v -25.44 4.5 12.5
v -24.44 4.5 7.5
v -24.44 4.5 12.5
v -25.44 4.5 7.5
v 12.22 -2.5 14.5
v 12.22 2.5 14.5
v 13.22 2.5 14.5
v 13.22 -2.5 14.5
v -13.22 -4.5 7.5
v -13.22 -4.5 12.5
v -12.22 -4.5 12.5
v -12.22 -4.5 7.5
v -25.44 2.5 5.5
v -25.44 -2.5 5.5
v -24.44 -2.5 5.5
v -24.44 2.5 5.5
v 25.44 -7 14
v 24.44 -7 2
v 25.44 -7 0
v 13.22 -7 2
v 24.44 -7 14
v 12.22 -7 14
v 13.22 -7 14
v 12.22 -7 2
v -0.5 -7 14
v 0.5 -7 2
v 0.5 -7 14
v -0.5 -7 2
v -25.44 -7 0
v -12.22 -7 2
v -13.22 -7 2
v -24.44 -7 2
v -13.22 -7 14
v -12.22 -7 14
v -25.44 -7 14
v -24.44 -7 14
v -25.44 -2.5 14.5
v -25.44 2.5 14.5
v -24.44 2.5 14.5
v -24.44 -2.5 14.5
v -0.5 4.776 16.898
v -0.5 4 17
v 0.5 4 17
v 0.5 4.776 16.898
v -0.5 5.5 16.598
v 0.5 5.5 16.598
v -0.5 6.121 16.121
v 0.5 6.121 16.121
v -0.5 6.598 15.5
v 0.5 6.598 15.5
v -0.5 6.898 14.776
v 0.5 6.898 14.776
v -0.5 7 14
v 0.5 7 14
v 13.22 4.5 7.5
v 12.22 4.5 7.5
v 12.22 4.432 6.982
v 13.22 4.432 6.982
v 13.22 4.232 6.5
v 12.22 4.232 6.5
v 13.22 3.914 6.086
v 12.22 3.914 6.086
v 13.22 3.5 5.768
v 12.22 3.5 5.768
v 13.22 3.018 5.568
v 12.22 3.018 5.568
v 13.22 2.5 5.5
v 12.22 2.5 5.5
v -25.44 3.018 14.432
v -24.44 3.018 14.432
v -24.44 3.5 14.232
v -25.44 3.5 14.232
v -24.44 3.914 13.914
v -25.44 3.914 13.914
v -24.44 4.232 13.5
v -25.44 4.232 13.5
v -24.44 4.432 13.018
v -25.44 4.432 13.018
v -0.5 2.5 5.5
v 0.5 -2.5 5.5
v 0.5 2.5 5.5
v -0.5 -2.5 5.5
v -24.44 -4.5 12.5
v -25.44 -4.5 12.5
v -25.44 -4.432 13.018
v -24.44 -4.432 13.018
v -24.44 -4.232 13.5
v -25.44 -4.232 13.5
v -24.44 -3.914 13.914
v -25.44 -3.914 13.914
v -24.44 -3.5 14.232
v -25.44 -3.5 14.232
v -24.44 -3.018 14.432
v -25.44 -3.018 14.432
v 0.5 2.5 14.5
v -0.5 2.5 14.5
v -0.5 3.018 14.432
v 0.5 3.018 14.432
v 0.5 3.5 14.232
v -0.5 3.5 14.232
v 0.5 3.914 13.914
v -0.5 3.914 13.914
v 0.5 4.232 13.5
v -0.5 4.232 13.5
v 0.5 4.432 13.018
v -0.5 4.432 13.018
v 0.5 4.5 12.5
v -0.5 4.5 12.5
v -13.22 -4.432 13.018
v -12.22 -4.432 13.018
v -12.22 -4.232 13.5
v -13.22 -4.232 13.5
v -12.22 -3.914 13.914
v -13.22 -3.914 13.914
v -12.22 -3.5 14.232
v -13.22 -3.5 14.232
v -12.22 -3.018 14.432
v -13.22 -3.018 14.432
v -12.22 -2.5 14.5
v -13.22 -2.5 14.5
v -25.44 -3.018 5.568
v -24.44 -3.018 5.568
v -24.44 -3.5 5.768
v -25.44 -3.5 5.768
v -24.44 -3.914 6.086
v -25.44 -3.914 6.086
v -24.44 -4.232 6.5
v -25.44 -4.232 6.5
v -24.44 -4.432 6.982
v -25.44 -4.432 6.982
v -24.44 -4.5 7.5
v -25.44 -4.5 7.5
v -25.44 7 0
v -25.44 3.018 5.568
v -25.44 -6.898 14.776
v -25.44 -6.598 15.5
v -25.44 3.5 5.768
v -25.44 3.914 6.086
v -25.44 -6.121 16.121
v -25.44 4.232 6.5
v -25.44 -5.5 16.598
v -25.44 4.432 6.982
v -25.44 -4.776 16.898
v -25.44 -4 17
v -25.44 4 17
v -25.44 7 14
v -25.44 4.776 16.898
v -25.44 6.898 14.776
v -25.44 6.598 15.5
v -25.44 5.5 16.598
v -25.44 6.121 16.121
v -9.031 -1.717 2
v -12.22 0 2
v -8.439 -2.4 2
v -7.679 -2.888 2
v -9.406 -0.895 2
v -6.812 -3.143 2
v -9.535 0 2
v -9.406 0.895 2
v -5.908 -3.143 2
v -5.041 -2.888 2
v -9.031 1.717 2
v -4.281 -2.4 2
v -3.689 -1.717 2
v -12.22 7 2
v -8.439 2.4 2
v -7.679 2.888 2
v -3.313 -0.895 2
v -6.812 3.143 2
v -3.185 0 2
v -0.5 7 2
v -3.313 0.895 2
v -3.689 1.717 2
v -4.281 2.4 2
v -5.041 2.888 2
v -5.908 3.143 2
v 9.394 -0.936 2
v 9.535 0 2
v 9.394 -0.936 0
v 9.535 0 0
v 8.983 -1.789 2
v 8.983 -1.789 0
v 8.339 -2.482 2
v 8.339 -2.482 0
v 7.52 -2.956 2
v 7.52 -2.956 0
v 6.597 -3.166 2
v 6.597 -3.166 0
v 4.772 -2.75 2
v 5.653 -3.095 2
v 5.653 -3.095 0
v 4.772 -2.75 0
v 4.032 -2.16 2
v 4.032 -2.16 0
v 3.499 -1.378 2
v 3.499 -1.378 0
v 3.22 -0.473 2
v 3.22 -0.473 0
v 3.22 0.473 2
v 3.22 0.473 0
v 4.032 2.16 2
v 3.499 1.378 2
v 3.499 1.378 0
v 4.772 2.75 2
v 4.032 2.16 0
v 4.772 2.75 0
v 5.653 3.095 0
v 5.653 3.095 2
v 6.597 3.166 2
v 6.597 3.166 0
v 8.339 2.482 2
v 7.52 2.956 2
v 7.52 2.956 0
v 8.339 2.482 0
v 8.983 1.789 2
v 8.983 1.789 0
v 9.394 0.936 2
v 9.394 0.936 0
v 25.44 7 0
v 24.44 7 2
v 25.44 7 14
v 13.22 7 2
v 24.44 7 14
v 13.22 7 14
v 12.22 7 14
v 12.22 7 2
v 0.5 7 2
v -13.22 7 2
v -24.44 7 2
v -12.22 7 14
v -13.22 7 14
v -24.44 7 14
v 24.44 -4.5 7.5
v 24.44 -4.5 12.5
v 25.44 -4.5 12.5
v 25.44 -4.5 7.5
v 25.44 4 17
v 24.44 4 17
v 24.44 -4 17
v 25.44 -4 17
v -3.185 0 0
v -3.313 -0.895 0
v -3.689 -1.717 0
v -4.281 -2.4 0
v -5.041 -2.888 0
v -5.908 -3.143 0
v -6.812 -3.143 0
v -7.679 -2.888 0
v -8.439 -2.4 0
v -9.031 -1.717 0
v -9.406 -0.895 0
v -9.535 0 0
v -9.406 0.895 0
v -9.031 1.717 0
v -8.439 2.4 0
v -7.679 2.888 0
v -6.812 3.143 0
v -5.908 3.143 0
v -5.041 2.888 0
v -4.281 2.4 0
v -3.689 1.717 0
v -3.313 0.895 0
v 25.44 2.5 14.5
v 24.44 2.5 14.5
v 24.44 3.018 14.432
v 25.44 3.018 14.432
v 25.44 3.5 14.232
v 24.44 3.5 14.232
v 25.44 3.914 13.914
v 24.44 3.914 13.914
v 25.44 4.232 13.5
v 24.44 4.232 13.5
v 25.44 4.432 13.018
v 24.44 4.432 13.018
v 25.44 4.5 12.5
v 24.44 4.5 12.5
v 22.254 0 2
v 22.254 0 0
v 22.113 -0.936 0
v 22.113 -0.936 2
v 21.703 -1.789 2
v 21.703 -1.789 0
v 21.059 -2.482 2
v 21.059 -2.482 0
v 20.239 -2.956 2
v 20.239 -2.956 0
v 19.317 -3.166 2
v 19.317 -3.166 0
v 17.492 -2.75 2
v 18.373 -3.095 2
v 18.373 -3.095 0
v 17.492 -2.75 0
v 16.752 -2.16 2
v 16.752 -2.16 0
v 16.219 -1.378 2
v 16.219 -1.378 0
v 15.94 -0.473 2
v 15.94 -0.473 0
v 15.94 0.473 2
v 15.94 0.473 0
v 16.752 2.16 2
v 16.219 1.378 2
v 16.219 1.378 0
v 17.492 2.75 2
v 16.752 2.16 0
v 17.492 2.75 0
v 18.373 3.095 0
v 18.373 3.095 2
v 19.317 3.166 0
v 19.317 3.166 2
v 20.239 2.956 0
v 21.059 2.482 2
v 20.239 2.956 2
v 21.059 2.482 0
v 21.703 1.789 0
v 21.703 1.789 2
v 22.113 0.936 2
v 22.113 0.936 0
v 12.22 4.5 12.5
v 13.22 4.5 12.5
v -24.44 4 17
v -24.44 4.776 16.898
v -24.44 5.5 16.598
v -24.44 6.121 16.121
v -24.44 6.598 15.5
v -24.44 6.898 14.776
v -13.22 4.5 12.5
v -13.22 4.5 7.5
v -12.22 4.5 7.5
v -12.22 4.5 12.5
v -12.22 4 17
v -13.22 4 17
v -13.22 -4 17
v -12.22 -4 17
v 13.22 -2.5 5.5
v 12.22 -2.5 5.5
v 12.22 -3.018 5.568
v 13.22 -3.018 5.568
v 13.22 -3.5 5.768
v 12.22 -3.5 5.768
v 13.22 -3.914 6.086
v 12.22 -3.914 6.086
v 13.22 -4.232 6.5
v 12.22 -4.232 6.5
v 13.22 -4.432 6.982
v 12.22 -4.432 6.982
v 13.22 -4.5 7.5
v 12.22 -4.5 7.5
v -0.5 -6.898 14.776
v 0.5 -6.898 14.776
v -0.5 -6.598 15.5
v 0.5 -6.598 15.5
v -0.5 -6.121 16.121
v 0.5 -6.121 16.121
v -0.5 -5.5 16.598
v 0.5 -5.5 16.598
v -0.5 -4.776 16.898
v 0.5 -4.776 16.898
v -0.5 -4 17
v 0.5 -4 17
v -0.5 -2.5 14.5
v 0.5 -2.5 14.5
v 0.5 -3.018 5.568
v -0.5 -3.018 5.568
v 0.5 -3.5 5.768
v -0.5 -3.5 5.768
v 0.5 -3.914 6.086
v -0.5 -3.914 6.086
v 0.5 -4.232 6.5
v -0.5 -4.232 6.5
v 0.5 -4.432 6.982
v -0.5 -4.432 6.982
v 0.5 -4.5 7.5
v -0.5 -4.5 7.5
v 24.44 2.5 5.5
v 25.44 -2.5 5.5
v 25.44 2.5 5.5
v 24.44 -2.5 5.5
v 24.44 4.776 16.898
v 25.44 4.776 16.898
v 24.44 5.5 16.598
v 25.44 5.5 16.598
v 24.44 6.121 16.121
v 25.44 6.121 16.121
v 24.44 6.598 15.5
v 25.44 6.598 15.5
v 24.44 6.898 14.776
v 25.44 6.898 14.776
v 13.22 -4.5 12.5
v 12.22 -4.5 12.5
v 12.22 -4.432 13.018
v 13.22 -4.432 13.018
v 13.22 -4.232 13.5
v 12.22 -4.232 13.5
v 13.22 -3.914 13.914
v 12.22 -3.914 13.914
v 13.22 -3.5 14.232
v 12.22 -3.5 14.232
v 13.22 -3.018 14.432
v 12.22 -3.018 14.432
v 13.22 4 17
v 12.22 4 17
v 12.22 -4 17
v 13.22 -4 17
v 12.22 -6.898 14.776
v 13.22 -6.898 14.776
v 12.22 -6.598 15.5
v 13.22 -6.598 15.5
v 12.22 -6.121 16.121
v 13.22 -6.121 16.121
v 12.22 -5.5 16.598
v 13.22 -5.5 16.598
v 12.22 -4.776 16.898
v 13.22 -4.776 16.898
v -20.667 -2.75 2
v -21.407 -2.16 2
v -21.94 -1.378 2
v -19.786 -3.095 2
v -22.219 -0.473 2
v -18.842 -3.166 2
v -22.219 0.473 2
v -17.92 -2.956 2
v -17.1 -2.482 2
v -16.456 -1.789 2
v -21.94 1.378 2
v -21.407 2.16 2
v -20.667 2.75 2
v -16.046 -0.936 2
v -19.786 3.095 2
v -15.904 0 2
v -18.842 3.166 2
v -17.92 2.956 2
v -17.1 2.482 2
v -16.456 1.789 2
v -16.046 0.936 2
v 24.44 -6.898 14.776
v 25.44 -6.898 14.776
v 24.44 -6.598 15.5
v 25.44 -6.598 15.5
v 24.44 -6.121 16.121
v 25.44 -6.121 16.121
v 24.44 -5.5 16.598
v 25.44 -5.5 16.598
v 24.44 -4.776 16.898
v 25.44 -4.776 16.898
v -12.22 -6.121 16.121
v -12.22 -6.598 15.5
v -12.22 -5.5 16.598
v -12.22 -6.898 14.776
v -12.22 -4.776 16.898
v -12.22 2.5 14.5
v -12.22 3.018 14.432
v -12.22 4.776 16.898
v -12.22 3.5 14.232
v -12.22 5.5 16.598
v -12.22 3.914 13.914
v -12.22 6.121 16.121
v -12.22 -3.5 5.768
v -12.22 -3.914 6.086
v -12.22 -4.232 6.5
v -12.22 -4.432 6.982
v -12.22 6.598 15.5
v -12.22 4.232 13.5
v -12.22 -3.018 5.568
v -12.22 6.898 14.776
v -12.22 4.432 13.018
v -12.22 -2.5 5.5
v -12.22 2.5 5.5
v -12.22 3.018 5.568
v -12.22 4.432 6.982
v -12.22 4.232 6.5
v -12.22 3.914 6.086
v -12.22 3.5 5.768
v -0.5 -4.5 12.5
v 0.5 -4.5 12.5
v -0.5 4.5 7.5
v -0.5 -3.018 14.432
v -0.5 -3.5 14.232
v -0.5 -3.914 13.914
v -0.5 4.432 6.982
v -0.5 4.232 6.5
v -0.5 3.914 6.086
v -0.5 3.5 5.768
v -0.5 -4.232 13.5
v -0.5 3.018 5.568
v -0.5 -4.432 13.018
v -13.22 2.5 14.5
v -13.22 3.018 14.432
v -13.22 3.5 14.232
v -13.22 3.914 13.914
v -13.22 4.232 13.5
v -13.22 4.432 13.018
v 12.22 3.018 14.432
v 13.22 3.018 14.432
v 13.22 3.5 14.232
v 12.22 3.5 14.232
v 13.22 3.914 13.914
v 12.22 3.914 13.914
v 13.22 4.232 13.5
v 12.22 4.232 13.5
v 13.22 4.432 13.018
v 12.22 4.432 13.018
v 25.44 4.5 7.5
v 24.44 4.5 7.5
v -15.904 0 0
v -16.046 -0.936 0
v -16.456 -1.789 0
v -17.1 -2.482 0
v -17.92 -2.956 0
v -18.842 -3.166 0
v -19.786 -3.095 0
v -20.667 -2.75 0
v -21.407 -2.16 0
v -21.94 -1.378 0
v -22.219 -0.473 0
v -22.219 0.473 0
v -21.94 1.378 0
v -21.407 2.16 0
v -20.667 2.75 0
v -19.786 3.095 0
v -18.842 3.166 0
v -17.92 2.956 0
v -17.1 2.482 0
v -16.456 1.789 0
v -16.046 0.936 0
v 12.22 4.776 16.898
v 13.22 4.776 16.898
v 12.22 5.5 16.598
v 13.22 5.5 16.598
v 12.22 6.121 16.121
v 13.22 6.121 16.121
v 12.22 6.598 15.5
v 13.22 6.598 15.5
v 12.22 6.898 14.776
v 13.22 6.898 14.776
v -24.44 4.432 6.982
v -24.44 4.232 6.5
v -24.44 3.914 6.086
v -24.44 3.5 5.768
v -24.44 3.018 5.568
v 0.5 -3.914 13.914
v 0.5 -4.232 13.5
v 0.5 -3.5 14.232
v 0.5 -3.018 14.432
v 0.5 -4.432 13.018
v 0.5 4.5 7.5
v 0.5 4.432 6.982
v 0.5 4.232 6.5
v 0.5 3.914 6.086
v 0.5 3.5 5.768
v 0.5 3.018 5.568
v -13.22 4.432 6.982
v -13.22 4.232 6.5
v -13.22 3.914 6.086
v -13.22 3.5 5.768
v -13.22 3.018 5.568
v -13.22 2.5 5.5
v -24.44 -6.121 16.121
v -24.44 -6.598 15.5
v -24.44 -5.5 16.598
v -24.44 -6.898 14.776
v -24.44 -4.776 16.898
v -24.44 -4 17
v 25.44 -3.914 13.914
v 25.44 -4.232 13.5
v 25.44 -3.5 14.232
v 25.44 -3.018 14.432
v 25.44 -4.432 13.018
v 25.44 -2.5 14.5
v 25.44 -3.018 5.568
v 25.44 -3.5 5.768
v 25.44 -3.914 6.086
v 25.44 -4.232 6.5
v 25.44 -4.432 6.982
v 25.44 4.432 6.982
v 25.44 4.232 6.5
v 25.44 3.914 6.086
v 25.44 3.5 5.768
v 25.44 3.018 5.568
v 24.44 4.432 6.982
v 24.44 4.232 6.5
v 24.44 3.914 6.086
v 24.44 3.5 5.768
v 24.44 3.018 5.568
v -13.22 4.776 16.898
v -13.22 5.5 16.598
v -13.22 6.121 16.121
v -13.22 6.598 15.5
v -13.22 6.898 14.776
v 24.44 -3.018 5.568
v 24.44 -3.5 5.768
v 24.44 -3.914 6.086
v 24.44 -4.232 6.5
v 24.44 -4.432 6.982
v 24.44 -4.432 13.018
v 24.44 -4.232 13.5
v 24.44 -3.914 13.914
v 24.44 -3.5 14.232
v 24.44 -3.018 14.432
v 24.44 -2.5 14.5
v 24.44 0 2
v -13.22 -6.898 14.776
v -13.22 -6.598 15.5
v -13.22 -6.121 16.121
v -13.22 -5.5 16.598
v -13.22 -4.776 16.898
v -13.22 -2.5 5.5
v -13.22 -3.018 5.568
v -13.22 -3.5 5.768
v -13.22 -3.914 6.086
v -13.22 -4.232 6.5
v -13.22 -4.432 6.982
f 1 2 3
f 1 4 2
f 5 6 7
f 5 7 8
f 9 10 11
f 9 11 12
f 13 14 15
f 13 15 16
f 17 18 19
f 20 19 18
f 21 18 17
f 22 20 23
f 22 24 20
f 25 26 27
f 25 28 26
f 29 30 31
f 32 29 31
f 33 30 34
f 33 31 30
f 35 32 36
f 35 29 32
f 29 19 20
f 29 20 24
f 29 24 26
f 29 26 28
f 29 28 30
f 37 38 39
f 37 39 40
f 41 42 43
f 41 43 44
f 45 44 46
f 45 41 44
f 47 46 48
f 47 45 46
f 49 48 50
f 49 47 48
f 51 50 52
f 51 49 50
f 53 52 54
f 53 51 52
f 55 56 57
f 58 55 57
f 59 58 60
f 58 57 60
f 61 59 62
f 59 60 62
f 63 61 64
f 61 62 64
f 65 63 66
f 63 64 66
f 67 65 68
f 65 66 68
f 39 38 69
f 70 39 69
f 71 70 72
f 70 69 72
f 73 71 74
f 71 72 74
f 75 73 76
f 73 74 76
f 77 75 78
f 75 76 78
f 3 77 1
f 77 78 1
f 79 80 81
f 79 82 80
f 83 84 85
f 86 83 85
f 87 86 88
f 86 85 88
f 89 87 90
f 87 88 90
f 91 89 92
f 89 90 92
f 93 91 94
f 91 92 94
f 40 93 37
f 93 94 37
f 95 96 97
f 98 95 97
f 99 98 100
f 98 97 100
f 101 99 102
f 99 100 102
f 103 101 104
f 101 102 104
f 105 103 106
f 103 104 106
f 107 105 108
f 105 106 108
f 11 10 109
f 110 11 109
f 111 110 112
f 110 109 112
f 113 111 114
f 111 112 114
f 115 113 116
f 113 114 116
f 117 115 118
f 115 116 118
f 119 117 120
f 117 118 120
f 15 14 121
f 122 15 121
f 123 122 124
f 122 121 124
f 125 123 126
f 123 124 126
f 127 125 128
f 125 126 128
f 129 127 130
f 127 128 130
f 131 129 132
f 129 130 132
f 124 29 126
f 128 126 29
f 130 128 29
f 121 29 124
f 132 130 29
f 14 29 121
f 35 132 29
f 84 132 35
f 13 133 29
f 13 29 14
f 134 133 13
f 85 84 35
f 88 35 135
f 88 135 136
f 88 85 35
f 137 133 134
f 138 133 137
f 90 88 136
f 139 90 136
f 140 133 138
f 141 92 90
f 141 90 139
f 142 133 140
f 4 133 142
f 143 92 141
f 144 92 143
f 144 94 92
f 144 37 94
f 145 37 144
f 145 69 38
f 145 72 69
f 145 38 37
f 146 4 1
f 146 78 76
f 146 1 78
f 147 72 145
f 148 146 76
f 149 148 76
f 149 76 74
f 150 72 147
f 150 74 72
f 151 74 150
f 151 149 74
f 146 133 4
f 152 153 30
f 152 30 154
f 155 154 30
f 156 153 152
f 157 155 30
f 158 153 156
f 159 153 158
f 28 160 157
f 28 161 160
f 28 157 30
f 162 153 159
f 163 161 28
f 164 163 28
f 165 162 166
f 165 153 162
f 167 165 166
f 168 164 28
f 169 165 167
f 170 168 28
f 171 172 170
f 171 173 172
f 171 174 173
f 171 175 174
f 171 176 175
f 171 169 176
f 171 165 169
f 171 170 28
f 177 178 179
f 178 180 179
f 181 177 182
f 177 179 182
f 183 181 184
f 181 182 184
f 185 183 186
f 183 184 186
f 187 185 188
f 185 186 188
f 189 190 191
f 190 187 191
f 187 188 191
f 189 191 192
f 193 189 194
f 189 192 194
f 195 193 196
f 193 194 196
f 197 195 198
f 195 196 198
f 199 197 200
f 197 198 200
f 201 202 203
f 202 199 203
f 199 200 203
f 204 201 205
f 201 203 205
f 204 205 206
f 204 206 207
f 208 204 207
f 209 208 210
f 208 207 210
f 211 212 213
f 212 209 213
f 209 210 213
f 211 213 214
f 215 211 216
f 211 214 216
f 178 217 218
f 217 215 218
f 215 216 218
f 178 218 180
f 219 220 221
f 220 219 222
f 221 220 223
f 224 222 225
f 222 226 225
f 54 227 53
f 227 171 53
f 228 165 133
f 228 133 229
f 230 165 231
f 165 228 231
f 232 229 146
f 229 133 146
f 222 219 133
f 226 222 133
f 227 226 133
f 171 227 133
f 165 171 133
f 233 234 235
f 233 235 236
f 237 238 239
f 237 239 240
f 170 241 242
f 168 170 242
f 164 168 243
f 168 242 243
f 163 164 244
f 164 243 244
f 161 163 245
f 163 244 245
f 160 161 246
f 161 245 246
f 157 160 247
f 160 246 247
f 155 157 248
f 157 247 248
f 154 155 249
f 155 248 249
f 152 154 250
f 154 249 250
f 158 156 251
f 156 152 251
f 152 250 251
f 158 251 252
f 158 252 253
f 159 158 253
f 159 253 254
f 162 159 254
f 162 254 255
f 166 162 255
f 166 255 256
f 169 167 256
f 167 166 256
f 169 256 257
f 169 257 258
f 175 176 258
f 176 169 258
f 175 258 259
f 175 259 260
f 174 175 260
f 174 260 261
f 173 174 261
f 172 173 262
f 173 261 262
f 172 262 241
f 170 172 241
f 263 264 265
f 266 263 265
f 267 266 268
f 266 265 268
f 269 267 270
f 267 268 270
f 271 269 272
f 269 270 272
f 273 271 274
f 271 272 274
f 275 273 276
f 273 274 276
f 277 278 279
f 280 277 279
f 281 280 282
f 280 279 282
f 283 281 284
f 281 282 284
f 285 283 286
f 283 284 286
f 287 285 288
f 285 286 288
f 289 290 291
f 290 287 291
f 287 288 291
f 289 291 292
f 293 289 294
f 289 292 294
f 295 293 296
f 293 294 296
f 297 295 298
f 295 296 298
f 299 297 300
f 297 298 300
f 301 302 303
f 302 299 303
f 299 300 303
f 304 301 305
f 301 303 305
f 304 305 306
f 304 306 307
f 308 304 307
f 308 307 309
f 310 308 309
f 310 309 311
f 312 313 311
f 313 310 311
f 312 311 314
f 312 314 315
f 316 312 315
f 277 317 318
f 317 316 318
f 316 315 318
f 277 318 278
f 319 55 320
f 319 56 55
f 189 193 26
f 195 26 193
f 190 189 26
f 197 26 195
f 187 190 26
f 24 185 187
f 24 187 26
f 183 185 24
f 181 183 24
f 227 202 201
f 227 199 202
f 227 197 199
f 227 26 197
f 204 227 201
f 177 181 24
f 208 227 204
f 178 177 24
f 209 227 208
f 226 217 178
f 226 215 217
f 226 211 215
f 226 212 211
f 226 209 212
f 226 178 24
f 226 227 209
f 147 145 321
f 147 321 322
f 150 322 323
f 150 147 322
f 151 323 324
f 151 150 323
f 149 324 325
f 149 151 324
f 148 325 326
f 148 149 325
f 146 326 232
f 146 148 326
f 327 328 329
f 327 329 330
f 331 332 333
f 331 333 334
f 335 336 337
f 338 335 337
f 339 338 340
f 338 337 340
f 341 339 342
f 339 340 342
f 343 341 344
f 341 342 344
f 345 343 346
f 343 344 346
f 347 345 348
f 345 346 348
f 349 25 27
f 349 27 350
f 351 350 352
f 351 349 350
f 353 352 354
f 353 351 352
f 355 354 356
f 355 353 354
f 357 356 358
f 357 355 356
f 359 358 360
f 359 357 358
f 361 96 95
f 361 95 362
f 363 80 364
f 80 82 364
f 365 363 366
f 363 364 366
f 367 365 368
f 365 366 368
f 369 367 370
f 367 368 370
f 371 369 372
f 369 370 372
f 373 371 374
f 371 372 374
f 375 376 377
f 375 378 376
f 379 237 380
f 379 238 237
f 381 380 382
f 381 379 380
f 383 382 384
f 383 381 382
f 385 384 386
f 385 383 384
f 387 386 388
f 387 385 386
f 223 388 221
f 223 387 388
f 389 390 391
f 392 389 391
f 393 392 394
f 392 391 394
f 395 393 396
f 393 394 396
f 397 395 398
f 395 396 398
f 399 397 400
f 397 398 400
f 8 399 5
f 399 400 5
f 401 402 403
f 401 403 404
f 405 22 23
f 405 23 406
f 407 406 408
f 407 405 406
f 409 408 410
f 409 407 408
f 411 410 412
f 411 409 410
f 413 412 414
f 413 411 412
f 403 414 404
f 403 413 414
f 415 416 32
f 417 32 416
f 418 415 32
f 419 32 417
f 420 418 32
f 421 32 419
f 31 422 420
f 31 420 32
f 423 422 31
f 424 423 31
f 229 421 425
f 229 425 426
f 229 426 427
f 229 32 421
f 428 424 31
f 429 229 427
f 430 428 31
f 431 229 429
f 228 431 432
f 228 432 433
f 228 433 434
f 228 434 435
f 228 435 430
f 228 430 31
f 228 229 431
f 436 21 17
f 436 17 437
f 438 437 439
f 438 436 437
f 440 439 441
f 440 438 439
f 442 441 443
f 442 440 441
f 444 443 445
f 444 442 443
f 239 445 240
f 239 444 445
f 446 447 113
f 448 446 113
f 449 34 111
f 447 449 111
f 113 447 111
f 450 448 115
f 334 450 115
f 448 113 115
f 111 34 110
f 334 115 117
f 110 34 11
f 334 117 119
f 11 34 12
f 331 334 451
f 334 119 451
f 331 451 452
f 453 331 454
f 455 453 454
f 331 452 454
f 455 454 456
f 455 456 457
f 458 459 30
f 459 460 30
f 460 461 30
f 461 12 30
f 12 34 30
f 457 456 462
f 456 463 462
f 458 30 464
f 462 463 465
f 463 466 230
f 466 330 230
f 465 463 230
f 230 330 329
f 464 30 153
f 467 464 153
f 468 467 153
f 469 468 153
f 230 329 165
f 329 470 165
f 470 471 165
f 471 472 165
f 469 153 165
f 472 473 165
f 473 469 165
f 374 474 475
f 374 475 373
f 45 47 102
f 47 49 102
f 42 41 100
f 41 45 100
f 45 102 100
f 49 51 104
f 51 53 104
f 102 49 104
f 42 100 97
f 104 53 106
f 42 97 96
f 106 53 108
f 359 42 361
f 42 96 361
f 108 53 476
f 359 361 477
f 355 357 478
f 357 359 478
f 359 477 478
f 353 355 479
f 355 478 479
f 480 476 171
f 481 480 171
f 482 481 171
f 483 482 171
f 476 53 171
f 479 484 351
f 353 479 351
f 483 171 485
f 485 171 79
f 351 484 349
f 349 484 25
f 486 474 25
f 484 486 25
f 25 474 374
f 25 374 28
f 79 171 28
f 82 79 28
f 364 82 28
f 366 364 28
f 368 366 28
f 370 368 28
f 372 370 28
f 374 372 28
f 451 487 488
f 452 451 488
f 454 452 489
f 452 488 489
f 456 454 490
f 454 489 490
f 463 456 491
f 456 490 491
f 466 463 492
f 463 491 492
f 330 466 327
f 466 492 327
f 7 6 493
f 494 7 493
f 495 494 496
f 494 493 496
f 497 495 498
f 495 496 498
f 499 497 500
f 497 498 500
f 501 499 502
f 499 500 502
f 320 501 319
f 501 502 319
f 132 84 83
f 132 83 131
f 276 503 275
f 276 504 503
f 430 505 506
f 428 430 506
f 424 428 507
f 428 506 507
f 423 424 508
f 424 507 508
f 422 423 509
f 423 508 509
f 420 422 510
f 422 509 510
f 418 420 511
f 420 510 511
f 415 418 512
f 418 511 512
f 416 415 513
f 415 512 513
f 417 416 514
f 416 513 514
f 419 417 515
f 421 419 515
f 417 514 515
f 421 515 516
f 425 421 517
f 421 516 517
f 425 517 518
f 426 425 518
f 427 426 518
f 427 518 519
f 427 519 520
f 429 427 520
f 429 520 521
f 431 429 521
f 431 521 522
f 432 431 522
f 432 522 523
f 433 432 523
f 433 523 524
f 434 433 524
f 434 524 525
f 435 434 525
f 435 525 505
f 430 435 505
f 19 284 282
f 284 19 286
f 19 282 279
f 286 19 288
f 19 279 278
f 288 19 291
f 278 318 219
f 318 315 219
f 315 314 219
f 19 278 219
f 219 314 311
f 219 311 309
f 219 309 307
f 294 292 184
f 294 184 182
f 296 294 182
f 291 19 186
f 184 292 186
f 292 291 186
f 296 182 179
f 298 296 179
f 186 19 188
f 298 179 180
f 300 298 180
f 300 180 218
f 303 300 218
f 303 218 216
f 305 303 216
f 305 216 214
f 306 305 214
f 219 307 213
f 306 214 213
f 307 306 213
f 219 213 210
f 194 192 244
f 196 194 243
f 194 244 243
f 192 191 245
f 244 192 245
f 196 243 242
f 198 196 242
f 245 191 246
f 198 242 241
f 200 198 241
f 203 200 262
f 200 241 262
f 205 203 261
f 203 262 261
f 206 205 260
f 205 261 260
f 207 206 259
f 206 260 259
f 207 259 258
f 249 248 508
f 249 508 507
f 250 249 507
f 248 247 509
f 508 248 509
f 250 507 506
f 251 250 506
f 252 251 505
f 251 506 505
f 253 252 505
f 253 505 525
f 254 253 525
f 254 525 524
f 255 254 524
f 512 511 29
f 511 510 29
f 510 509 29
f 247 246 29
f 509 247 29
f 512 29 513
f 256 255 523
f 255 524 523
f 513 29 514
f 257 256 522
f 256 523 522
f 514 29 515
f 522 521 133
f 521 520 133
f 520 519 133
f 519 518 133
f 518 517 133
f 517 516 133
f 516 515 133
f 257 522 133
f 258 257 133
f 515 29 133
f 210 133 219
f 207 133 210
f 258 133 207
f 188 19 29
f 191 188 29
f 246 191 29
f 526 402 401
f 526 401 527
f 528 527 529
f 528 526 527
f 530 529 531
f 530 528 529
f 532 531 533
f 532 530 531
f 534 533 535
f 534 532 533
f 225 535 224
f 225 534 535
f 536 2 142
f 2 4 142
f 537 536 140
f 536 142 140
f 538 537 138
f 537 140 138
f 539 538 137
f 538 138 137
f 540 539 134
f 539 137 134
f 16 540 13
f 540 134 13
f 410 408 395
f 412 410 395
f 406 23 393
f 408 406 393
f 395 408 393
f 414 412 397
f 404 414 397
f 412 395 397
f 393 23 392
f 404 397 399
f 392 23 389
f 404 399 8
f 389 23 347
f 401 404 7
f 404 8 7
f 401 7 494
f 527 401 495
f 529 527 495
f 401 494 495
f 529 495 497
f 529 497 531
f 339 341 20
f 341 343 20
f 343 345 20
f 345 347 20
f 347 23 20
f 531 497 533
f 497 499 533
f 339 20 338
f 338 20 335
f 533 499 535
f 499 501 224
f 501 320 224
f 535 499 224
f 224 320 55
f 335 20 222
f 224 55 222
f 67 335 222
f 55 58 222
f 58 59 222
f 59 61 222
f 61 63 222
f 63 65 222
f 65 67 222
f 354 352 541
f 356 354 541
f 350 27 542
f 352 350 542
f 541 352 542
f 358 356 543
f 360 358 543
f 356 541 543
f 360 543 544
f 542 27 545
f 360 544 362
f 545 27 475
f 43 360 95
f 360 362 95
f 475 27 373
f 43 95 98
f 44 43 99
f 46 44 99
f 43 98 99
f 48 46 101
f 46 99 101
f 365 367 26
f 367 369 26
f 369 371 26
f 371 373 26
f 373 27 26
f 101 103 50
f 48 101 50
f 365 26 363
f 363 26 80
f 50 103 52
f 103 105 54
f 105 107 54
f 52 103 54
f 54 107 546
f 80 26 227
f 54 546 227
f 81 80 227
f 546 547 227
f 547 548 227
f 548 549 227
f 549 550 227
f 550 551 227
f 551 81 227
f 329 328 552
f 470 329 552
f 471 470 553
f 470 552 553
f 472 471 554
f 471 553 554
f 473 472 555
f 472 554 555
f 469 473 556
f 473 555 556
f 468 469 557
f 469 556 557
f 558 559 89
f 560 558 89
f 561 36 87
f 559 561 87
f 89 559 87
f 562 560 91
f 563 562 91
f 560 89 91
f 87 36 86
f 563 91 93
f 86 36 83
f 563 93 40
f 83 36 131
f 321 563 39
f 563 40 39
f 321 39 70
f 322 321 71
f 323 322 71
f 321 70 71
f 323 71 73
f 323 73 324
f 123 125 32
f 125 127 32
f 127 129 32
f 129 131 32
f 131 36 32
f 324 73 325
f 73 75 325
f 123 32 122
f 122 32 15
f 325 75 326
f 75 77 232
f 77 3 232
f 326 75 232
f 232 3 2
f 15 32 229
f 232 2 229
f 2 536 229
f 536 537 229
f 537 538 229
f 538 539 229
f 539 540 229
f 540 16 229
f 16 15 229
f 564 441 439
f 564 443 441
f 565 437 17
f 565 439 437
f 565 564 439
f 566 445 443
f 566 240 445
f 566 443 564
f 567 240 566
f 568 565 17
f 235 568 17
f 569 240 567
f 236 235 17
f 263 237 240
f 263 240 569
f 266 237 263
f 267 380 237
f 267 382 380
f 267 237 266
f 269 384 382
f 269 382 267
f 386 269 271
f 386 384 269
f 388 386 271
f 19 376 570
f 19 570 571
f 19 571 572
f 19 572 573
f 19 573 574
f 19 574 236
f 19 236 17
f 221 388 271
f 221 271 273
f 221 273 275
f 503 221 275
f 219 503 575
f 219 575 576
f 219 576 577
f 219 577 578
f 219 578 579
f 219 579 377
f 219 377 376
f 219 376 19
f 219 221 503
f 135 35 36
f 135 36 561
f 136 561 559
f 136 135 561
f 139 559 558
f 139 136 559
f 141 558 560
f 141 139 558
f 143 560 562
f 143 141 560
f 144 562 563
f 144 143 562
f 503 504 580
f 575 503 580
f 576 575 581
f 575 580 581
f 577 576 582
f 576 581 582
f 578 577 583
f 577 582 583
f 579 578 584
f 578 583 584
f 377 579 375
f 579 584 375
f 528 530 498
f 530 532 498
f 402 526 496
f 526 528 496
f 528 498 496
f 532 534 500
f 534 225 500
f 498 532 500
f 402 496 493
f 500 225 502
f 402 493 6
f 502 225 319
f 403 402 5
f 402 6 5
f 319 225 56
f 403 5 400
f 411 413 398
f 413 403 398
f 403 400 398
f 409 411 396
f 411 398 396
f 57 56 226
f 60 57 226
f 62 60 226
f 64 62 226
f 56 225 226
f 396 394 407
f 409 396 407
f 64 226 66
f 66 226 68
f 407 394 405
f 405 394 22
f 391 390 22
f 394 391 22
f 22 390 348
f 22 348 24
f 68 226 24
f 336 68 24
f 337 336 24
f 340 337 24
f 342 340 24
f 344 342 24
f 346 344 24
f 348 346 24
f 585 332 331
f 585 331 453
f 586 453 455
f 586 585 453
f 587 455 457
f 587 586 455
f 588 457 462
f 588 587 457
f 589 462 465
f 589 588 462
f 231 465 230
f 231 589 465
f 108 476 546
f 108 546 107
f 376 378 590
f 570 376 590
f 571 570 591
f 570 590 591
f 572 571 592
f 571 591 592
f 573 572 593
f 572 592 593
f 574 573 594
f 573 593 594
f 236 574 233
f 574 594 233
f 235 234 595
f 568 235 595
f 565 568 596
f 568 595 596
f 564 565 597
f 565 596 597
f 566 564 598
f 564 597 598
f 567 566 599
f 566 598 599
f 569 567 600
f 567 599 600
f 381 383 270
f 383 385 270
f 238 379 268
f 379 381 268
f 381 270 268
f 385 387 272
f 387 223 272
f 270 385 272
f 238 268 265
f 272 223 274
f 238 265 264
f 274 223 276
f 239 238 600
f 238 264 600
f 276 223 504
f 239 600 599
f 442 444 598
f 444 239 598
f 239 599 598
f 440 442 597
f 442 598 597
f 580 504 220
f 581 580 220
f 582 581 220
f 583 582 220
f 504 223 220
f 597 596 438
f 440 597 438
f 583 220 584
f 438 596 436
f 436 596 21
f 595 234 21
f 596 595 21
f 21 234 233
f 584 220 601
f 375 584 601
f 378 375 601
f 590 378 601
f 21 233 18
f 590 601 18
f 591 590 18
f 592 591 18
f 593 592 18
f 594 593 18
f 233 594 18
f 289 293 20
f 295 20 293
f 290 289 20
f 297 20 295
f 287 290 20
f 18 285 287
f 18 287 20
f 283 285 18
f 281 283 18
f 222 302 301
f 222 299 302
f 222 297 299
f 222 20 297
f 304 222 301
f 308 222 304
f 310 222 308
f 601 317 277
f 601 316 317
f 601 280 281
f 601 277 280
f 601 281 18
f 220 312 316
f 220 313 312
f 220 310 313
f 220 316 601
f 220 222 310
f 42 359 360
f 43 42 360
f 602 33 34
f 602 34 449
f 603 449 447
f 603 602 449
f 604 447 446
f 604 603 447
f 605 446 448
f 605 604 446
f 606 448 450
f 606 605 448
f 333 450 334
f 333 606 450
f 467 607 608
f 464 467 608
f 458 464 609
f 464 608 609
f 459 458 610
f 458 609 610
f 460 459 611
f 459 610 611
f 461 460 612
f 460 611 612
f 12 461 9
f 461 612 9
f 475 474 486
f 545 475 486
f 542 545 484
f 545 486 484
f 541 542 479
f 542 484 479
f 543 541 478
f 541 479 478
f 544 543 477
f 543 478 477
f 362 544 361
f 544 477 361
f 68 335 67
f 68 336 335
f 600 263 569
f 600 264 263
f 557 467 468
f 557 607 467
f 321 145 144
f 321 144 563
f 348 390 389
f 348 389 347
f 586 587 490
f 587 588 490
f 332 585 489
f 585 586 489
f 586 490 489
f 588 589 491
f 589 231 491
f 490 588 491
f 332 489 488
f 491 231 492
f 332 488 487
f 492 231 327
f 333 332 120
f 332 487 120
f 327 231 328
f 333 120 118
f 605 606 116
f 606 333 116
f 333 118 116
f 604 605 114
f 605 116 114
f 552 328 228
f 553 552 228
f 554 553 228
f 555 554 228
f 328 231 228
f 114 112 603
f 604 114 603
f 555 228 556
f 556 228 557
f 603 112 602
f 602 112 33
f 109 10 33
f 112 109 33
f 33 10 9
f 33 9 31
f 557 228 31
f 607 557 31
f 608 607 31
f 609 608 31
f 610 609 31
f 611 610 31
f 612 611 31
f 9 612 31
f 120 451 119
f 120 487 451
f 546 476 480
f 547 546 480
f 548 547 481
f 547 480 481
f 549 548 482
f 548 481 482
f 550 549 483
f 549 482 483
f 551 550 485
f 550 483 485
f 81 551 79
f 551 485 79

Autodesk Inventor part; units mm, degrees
ref_plane "YZ Plane" through (0, 0, 0) normal (1, 0, 0) x (0, 1, 0)
ref_plane "XZ Plane" through (0, 0, 0) normal (0, 1, 0) x (-1, 0, 0)
ref_plane "XY Plane" through (0, 0, 0) normal (0, 0, 1) x (1, 0, 0)
sketch "Sketch1" plane through (0, 0, 0) normal (0, 0, 1) x (1, 0, 0)
  circle A0 centre (-19.0795, 0) radius 3.175 projected
  circle A1 centre (-6.3598, 0) radius 3.175 projected
  circle A2 centre (6.3597, 0) radius 3.175 projected
  circle A3 centre (19.0795, 0) radius 3.175 projected
  line L0 (25, -19) -> (25, 19) projected
  line L1 (-25, 19) -> (-25, -19) projected
  line L2 (-19.0795, 0) -> (-6.3598, 0)
  line L3 (-6.3598, 0) -> (-12.7197, 0)
  line L4 (-19.0795, 0) -> (-25.4395, 0)
  line L5 (19.0795, 0) -> (25.4395, 0)
  line L6 (-12.2197, 7) -> (-12.2197, -7)
  line L7 (-12.2197, -7) -> (-13.2197, -7)
  line L8 (-13.2197, -7) -> (-13.2197, 7)
  line L9 (-13.2197, 7) -> (-12.2197, 7)
  line L10 (-12.2197, 7) -> (-13.2197, -7) construction
  line L11 (-12.2197, -7) -> (-13.2197, 7) construction
  line L12 (-25.4395, 0) -> (-25.9395, 0)
  line L13 (-25.9395, 0) -> (-25.9395, 7)
  line L14 (25.4395, 0) -> (25.9395, 0)
  line L15 (25.9395, 0) -> (25.9395, -7)
  line L16 (-25.9395, 7) -> (25.9395, 7)
  line L17 (25.9395, 7) -> (25.9395, -7)
  line L18 (25.9395, -7) -> (-25.9395, -7)
  line L19 (-25.9395, -7) -> (-25.9395, 7)
  point P0 (0, 0)
  point P1 (-25, 7)
  point P2 (-25, -7)
  point P3 (25, -7)
  point P4 (25, 7)
  dimension "d0" = 6.36
  dimension "d1" = 6.36
  dimension "d2" = 14
  dimension "d3" = 1
  dimension "d4" = 0.5
  dimension "d5" = 7
  dimension "d6" = 0.5
  dimension "d7" = 7
extrude "Extrusion1" add sketch "Sketch1" along normal blind 2 contours L2 L8 L18 L1 L4 A0 | A0 L4 L1 L16 L8 L2 | L8 L9 L6 L2 | L2 L6 L7 L8 | L6 L16 L0 L18
sketch "Sketch2" plane through (0, 0, 2) normal (0, 0, 1) x (1, 0, 0)
  line L0 (-25, 7) -> (-24, 7)
  line L1 (25, 7) -> (-25, 7) projected
  circle A0 centre (-19.0795, 0) radius 3.175 projected
  circle A1 centre (-6.3598, 0) radius 3.175 projected
  line L2 (-19.0795, 0) -> (-6.3598, 0)
  line L3 (-13.2197, 7) -> (-13.2197, -7)
  line L4 (-13.2197, -7) -> (-12.2197, -7)
  line L5 (-12.2197, -7) -> (-12.2197, 7)
  line L6 (-12.2197, 7) -> (-13.2197, 7)
  line L7 (-13.2197, 7) -> (-12.2197, -7) construction
  line L8 (-13.2197, -7) -> (-12.2197, 7) construction
  line L9 (-0.5, 7) -> (-0.5, -7)
  line L10 (-0.5, -7) -> (0.5, -7)
  line L11 (0.5, -7) -> (0.5, 7)
  line L12 (0.5, 7) -> (-0.5, 7)
  line L13 (-0.5, 7) -> (0.5, -7) construction
  line L14 (-0.5, -7) -> (0.5, 7) construction
  circle A2 centre (6.3597, 0) radius 3.175 projected
  circle A3 centre (19.0795, 0) radius 3.175 projected
  line L15 (6.3597, 0) -> (19.0795, 0)
  line L16 (12.2196, 7) -> (12.2196, -7)
  line L17 (12.2196, -7) -> (13.2196, -7)
  line L18 (13.2196, -7) -> (13.2196, 7)
  line L19 (13.2196, 7) -> (12.2196, 7)
  line L20 (12.2196, 7) -> (13.2196, -7) construction
  line L21 (12.2196, -7) -> (13.2196, 7) construction
  line L22 (-24, 7) -> (-25, 7)
  line L23 (-25, 7) -> (-25, -7)
  line L24 (-25, -7) -> (-24, -7)
  line L25 (25, -7) -> (25, 7) projected
  line L26 (-25, -7) -> (25, -7) projected
  line L27 (25, 7) -> (24, 7)
  line L28 (24, 7) -> (24, -7)
  line L29 (24, -7) -> (25, -7)
  line L30 (25, -7) -> (25, 7)
  line L31 (-12.7197, 0) -> (-24.4397, 0)
  line L32 (-24.4397, 0) -> (-24.4397, 7)
  line L33 (-24.4397, 7) -> (-25.4397, 7)
  line L34 (-25.4397, 7) -> (-25.4397, -7)
  line L35 (-25.4397, -7) -> (-24.4397, -7)
  line L36 (-24.4397, -7) -> (-24.4397, 7)
  line L37 (0, 7) -> (0, -7)
  line L38 (25.4397, 7) -> (25.4397, -7)
  line L39 (25.4397, 7) -> (24.4397, 7)
  line L40 (24.4397, 7) -> (24.4397, -7)
  line L41 (24.4397, -7) -> (25.4397, -7)
  line L42 (25.4397, -7) -> (25.4397, 7)
  point P0 (0, 0)
  point P1 (12.7196, 0)
  dimension "d10" = 1
  dimension "d11" = 1
  dimension "d12" = 1
  dimension "d13" = 1
  dimension "d14" = 1
  dimension "d27" = 11.72
  dimension "d28" = 1
  dimension "d29" = 1
extrude "Extrusion2" add sketch "Sketch2" along normal blind 15 contours L0 L32 L36 L24 L23 | L23 L35 L34 L33 | L1 L5 L2 L3 | L2 L5 L4 L3 | L1 L37 L10 L9 | L1 L11 L10 L37 | L1 L18 L15 L16 | L15 L18 L17 L16 | L1 L25 L26 L40 | L39 L38 L41 L25
sketch "Sketch3" plane through (-25, -7, 0) normal (-1, 0, 0) x (0, 0, 1)
  line L0 (2, 14) -> (2, 0) projected
  line L1 (0, 14) -> (2, 14) projected
  line L2 (0, 0) -> (2, 0) projected
  line L3 (14, 14) -> (3, 14)
  line L4 (3, 14) -> (3, 0)
  line L5 (3, 0) -> (14, 0)
  line L6 (17, 3) -> (17, 11)
  line L7 (7.5, 11.5) -> (12.5, 11.5)
  line L8 (14.5, 9.5) -> (14.5, 4.5)
  line L9 (12.5, 2.5) -> (7.5, 2.5)
  line L10 (5.5, 4.5) -> (5.5, 9.5)
  line L11 (5.5, 11.5) -> (14.5, 2.5) construction
  line L12 (14.5, 11.5) -> (5.5, 2.5) construction
  arc A0 (17, 11) -> (14, 14) centre (14, 11) ccw
  arc A1 (14, 0) -> (17, 3) centre (14, 3) ccw
  arc A2 (14.5, 9.5) -> (12.5, 11.5) centre (12.5, 9.5) ccw
  arc A3 (12.5, 2.5) -> (14.5, 4.5) centre (12.5, 4.5) ccw
  arc A4 (7.5, 11.5) -> (5.5, 9.5) centre (7.5, 9.5) ccw
  arc A5 (5.5, 4.5) -> (7.5, 2.5) centre (7.5, 4.5) ccw
  line L13 (17, 14) -> (17, 0) projected
  line L14 (0, 14) -> (2, 14) projected
  point P0 (0, 7)
  point P1 (10, 7)
  dimension "d18" = 14
  dimension "d19" = 9
  dimension "d20" = 9
  dimension "d21" = 3
  dimension "d22" = 3
  dimension "d23" = 2
extrude "Extrusion3" cut sketch "Sketch3" against normal through all contours L7 A2 L8 A3 L9 A5 L10 A4
sketch "Sketch4" plane through (-25.4397, -7, 2) normal (-1, 0, 0) x (0, 0, 1)
  line L0 (0, 14) -> (0, 0)
  line L1 (-2, 14) -> (0, 14)
  line L2 (-2, 0) -> (0, 0)
  line L3 (12, 14) -> (1, 14)
  line L4 (1, 14) -> (1, 0)
  line L5 (1, 0) -> (12, 0)
  line L6 (15, 3) -> (15, 11)
  line L7 (5.5, 11.5) -> (10.5, 11.5)
  line L8 (12.5, 9.5) -> (12.5, 4.5)
  line L9 (10.5, 2.5) -> (5.5, 2.5)
  line L10 (3.5, 4.5) -> (3.5, 9.5)
  line L11 (3.5, 11.5) -> (12.5, 2.5) construction
  line L12 (12.5, 11.5) -> (3.5, 2.5) construction
  arc A0 (15, 11) -> (12, 14) centre (12, 11) ccw
  arc A1 (12, 0) -> (15, 3) centre (12, 3) ccw
  arc A2 (12.5, 9.5) -> (10.5, 11.5) centre (10.5, 9.5) ccw
  arc A3 (10.5, 2.5) -> (12.5, 4.5) centre (10.5, 4.5) ccw
  arc A4 (5.5, 11.5) -> (3.5, 9.5) centre (5.5, 9.5) ccw
  arc A5 (3.5, 4.5) -> (5.5, 2.5) centre (5.5, 4.5) ccw
  line L13 (15, 14) -> (15, 0)
  line L14 (-2, 14) -> (0, 14)
  line L15 (-2, 0) -> (0, 0) projected
  line L16 (-2, 0) -> (15, 0)
  line L17 (15, 0) -> (15, 14)
  line L18 (15, 14) -> (-2, 14)
  line L19 (-2, 14) -> (-2, 0)
  point P0 (-2, 7)
  point P1 (-2, 7)
  point P2 (15, 0)
  point P3 (8, 7)
  point P4 (12, 0)
  dimension "d30" = 14
  dimension "d31" = 9
  dimension "d32" = 9
  dimension "d33" = 3
  dimension "d34" = 3
  dimension "d35" = 2
extrude "Extrusion4" cut sketch "Sketch4" against normal through all contours L18 L13 A0 | A1 L13 L16 | L7 A2 L8 A3 L9 A5 L10 A4
sketch "Sketch5" plane through (-25, -7, 0) normal (-1, 0, 0) x (0, 0, 1)
  line L0 (2, 14) -> (2, 0) projected
  line L1 (0, 14) -> (2, 14) projected
  line L2 (0, 0) -> (0, 14) projected
  line L3 (2, 14) -> (0, 14)
  line L4 (0, 14) -> (0, 0)
  line L5 (0, 0) -> (2, 0)
  line L6 (2, 0) -> (2, 14)
  point P0 (0, 7)
  point P1 (2, 0)
extrude "Extrusion5" add sketch "Sketch5" along normal up to surface (0.4397 mm away)
sketch "Sketch6" plane through (25, -7, 0) normal (1, 0, 0) x (0, 0, -1)
  line L0 (-2, 0) -> (-2, 14) projected
  line L1 (0, 0) -> (0, 14) projected
  line L2 (0, 0) -> (0, 14) projected
  line L3 (0, 14) -> (-2, 14) projected
  line L4 (-2, 0) -> (-2, 14) projected
  line L5 (0, 0) -> (-2, 0) projected
  point P0 (0, 7)
extrude "Extrusion6" add sketch "Sketch6" along normal up to surface (0.4397 mm away)
properties part number "protector_small1x1"
